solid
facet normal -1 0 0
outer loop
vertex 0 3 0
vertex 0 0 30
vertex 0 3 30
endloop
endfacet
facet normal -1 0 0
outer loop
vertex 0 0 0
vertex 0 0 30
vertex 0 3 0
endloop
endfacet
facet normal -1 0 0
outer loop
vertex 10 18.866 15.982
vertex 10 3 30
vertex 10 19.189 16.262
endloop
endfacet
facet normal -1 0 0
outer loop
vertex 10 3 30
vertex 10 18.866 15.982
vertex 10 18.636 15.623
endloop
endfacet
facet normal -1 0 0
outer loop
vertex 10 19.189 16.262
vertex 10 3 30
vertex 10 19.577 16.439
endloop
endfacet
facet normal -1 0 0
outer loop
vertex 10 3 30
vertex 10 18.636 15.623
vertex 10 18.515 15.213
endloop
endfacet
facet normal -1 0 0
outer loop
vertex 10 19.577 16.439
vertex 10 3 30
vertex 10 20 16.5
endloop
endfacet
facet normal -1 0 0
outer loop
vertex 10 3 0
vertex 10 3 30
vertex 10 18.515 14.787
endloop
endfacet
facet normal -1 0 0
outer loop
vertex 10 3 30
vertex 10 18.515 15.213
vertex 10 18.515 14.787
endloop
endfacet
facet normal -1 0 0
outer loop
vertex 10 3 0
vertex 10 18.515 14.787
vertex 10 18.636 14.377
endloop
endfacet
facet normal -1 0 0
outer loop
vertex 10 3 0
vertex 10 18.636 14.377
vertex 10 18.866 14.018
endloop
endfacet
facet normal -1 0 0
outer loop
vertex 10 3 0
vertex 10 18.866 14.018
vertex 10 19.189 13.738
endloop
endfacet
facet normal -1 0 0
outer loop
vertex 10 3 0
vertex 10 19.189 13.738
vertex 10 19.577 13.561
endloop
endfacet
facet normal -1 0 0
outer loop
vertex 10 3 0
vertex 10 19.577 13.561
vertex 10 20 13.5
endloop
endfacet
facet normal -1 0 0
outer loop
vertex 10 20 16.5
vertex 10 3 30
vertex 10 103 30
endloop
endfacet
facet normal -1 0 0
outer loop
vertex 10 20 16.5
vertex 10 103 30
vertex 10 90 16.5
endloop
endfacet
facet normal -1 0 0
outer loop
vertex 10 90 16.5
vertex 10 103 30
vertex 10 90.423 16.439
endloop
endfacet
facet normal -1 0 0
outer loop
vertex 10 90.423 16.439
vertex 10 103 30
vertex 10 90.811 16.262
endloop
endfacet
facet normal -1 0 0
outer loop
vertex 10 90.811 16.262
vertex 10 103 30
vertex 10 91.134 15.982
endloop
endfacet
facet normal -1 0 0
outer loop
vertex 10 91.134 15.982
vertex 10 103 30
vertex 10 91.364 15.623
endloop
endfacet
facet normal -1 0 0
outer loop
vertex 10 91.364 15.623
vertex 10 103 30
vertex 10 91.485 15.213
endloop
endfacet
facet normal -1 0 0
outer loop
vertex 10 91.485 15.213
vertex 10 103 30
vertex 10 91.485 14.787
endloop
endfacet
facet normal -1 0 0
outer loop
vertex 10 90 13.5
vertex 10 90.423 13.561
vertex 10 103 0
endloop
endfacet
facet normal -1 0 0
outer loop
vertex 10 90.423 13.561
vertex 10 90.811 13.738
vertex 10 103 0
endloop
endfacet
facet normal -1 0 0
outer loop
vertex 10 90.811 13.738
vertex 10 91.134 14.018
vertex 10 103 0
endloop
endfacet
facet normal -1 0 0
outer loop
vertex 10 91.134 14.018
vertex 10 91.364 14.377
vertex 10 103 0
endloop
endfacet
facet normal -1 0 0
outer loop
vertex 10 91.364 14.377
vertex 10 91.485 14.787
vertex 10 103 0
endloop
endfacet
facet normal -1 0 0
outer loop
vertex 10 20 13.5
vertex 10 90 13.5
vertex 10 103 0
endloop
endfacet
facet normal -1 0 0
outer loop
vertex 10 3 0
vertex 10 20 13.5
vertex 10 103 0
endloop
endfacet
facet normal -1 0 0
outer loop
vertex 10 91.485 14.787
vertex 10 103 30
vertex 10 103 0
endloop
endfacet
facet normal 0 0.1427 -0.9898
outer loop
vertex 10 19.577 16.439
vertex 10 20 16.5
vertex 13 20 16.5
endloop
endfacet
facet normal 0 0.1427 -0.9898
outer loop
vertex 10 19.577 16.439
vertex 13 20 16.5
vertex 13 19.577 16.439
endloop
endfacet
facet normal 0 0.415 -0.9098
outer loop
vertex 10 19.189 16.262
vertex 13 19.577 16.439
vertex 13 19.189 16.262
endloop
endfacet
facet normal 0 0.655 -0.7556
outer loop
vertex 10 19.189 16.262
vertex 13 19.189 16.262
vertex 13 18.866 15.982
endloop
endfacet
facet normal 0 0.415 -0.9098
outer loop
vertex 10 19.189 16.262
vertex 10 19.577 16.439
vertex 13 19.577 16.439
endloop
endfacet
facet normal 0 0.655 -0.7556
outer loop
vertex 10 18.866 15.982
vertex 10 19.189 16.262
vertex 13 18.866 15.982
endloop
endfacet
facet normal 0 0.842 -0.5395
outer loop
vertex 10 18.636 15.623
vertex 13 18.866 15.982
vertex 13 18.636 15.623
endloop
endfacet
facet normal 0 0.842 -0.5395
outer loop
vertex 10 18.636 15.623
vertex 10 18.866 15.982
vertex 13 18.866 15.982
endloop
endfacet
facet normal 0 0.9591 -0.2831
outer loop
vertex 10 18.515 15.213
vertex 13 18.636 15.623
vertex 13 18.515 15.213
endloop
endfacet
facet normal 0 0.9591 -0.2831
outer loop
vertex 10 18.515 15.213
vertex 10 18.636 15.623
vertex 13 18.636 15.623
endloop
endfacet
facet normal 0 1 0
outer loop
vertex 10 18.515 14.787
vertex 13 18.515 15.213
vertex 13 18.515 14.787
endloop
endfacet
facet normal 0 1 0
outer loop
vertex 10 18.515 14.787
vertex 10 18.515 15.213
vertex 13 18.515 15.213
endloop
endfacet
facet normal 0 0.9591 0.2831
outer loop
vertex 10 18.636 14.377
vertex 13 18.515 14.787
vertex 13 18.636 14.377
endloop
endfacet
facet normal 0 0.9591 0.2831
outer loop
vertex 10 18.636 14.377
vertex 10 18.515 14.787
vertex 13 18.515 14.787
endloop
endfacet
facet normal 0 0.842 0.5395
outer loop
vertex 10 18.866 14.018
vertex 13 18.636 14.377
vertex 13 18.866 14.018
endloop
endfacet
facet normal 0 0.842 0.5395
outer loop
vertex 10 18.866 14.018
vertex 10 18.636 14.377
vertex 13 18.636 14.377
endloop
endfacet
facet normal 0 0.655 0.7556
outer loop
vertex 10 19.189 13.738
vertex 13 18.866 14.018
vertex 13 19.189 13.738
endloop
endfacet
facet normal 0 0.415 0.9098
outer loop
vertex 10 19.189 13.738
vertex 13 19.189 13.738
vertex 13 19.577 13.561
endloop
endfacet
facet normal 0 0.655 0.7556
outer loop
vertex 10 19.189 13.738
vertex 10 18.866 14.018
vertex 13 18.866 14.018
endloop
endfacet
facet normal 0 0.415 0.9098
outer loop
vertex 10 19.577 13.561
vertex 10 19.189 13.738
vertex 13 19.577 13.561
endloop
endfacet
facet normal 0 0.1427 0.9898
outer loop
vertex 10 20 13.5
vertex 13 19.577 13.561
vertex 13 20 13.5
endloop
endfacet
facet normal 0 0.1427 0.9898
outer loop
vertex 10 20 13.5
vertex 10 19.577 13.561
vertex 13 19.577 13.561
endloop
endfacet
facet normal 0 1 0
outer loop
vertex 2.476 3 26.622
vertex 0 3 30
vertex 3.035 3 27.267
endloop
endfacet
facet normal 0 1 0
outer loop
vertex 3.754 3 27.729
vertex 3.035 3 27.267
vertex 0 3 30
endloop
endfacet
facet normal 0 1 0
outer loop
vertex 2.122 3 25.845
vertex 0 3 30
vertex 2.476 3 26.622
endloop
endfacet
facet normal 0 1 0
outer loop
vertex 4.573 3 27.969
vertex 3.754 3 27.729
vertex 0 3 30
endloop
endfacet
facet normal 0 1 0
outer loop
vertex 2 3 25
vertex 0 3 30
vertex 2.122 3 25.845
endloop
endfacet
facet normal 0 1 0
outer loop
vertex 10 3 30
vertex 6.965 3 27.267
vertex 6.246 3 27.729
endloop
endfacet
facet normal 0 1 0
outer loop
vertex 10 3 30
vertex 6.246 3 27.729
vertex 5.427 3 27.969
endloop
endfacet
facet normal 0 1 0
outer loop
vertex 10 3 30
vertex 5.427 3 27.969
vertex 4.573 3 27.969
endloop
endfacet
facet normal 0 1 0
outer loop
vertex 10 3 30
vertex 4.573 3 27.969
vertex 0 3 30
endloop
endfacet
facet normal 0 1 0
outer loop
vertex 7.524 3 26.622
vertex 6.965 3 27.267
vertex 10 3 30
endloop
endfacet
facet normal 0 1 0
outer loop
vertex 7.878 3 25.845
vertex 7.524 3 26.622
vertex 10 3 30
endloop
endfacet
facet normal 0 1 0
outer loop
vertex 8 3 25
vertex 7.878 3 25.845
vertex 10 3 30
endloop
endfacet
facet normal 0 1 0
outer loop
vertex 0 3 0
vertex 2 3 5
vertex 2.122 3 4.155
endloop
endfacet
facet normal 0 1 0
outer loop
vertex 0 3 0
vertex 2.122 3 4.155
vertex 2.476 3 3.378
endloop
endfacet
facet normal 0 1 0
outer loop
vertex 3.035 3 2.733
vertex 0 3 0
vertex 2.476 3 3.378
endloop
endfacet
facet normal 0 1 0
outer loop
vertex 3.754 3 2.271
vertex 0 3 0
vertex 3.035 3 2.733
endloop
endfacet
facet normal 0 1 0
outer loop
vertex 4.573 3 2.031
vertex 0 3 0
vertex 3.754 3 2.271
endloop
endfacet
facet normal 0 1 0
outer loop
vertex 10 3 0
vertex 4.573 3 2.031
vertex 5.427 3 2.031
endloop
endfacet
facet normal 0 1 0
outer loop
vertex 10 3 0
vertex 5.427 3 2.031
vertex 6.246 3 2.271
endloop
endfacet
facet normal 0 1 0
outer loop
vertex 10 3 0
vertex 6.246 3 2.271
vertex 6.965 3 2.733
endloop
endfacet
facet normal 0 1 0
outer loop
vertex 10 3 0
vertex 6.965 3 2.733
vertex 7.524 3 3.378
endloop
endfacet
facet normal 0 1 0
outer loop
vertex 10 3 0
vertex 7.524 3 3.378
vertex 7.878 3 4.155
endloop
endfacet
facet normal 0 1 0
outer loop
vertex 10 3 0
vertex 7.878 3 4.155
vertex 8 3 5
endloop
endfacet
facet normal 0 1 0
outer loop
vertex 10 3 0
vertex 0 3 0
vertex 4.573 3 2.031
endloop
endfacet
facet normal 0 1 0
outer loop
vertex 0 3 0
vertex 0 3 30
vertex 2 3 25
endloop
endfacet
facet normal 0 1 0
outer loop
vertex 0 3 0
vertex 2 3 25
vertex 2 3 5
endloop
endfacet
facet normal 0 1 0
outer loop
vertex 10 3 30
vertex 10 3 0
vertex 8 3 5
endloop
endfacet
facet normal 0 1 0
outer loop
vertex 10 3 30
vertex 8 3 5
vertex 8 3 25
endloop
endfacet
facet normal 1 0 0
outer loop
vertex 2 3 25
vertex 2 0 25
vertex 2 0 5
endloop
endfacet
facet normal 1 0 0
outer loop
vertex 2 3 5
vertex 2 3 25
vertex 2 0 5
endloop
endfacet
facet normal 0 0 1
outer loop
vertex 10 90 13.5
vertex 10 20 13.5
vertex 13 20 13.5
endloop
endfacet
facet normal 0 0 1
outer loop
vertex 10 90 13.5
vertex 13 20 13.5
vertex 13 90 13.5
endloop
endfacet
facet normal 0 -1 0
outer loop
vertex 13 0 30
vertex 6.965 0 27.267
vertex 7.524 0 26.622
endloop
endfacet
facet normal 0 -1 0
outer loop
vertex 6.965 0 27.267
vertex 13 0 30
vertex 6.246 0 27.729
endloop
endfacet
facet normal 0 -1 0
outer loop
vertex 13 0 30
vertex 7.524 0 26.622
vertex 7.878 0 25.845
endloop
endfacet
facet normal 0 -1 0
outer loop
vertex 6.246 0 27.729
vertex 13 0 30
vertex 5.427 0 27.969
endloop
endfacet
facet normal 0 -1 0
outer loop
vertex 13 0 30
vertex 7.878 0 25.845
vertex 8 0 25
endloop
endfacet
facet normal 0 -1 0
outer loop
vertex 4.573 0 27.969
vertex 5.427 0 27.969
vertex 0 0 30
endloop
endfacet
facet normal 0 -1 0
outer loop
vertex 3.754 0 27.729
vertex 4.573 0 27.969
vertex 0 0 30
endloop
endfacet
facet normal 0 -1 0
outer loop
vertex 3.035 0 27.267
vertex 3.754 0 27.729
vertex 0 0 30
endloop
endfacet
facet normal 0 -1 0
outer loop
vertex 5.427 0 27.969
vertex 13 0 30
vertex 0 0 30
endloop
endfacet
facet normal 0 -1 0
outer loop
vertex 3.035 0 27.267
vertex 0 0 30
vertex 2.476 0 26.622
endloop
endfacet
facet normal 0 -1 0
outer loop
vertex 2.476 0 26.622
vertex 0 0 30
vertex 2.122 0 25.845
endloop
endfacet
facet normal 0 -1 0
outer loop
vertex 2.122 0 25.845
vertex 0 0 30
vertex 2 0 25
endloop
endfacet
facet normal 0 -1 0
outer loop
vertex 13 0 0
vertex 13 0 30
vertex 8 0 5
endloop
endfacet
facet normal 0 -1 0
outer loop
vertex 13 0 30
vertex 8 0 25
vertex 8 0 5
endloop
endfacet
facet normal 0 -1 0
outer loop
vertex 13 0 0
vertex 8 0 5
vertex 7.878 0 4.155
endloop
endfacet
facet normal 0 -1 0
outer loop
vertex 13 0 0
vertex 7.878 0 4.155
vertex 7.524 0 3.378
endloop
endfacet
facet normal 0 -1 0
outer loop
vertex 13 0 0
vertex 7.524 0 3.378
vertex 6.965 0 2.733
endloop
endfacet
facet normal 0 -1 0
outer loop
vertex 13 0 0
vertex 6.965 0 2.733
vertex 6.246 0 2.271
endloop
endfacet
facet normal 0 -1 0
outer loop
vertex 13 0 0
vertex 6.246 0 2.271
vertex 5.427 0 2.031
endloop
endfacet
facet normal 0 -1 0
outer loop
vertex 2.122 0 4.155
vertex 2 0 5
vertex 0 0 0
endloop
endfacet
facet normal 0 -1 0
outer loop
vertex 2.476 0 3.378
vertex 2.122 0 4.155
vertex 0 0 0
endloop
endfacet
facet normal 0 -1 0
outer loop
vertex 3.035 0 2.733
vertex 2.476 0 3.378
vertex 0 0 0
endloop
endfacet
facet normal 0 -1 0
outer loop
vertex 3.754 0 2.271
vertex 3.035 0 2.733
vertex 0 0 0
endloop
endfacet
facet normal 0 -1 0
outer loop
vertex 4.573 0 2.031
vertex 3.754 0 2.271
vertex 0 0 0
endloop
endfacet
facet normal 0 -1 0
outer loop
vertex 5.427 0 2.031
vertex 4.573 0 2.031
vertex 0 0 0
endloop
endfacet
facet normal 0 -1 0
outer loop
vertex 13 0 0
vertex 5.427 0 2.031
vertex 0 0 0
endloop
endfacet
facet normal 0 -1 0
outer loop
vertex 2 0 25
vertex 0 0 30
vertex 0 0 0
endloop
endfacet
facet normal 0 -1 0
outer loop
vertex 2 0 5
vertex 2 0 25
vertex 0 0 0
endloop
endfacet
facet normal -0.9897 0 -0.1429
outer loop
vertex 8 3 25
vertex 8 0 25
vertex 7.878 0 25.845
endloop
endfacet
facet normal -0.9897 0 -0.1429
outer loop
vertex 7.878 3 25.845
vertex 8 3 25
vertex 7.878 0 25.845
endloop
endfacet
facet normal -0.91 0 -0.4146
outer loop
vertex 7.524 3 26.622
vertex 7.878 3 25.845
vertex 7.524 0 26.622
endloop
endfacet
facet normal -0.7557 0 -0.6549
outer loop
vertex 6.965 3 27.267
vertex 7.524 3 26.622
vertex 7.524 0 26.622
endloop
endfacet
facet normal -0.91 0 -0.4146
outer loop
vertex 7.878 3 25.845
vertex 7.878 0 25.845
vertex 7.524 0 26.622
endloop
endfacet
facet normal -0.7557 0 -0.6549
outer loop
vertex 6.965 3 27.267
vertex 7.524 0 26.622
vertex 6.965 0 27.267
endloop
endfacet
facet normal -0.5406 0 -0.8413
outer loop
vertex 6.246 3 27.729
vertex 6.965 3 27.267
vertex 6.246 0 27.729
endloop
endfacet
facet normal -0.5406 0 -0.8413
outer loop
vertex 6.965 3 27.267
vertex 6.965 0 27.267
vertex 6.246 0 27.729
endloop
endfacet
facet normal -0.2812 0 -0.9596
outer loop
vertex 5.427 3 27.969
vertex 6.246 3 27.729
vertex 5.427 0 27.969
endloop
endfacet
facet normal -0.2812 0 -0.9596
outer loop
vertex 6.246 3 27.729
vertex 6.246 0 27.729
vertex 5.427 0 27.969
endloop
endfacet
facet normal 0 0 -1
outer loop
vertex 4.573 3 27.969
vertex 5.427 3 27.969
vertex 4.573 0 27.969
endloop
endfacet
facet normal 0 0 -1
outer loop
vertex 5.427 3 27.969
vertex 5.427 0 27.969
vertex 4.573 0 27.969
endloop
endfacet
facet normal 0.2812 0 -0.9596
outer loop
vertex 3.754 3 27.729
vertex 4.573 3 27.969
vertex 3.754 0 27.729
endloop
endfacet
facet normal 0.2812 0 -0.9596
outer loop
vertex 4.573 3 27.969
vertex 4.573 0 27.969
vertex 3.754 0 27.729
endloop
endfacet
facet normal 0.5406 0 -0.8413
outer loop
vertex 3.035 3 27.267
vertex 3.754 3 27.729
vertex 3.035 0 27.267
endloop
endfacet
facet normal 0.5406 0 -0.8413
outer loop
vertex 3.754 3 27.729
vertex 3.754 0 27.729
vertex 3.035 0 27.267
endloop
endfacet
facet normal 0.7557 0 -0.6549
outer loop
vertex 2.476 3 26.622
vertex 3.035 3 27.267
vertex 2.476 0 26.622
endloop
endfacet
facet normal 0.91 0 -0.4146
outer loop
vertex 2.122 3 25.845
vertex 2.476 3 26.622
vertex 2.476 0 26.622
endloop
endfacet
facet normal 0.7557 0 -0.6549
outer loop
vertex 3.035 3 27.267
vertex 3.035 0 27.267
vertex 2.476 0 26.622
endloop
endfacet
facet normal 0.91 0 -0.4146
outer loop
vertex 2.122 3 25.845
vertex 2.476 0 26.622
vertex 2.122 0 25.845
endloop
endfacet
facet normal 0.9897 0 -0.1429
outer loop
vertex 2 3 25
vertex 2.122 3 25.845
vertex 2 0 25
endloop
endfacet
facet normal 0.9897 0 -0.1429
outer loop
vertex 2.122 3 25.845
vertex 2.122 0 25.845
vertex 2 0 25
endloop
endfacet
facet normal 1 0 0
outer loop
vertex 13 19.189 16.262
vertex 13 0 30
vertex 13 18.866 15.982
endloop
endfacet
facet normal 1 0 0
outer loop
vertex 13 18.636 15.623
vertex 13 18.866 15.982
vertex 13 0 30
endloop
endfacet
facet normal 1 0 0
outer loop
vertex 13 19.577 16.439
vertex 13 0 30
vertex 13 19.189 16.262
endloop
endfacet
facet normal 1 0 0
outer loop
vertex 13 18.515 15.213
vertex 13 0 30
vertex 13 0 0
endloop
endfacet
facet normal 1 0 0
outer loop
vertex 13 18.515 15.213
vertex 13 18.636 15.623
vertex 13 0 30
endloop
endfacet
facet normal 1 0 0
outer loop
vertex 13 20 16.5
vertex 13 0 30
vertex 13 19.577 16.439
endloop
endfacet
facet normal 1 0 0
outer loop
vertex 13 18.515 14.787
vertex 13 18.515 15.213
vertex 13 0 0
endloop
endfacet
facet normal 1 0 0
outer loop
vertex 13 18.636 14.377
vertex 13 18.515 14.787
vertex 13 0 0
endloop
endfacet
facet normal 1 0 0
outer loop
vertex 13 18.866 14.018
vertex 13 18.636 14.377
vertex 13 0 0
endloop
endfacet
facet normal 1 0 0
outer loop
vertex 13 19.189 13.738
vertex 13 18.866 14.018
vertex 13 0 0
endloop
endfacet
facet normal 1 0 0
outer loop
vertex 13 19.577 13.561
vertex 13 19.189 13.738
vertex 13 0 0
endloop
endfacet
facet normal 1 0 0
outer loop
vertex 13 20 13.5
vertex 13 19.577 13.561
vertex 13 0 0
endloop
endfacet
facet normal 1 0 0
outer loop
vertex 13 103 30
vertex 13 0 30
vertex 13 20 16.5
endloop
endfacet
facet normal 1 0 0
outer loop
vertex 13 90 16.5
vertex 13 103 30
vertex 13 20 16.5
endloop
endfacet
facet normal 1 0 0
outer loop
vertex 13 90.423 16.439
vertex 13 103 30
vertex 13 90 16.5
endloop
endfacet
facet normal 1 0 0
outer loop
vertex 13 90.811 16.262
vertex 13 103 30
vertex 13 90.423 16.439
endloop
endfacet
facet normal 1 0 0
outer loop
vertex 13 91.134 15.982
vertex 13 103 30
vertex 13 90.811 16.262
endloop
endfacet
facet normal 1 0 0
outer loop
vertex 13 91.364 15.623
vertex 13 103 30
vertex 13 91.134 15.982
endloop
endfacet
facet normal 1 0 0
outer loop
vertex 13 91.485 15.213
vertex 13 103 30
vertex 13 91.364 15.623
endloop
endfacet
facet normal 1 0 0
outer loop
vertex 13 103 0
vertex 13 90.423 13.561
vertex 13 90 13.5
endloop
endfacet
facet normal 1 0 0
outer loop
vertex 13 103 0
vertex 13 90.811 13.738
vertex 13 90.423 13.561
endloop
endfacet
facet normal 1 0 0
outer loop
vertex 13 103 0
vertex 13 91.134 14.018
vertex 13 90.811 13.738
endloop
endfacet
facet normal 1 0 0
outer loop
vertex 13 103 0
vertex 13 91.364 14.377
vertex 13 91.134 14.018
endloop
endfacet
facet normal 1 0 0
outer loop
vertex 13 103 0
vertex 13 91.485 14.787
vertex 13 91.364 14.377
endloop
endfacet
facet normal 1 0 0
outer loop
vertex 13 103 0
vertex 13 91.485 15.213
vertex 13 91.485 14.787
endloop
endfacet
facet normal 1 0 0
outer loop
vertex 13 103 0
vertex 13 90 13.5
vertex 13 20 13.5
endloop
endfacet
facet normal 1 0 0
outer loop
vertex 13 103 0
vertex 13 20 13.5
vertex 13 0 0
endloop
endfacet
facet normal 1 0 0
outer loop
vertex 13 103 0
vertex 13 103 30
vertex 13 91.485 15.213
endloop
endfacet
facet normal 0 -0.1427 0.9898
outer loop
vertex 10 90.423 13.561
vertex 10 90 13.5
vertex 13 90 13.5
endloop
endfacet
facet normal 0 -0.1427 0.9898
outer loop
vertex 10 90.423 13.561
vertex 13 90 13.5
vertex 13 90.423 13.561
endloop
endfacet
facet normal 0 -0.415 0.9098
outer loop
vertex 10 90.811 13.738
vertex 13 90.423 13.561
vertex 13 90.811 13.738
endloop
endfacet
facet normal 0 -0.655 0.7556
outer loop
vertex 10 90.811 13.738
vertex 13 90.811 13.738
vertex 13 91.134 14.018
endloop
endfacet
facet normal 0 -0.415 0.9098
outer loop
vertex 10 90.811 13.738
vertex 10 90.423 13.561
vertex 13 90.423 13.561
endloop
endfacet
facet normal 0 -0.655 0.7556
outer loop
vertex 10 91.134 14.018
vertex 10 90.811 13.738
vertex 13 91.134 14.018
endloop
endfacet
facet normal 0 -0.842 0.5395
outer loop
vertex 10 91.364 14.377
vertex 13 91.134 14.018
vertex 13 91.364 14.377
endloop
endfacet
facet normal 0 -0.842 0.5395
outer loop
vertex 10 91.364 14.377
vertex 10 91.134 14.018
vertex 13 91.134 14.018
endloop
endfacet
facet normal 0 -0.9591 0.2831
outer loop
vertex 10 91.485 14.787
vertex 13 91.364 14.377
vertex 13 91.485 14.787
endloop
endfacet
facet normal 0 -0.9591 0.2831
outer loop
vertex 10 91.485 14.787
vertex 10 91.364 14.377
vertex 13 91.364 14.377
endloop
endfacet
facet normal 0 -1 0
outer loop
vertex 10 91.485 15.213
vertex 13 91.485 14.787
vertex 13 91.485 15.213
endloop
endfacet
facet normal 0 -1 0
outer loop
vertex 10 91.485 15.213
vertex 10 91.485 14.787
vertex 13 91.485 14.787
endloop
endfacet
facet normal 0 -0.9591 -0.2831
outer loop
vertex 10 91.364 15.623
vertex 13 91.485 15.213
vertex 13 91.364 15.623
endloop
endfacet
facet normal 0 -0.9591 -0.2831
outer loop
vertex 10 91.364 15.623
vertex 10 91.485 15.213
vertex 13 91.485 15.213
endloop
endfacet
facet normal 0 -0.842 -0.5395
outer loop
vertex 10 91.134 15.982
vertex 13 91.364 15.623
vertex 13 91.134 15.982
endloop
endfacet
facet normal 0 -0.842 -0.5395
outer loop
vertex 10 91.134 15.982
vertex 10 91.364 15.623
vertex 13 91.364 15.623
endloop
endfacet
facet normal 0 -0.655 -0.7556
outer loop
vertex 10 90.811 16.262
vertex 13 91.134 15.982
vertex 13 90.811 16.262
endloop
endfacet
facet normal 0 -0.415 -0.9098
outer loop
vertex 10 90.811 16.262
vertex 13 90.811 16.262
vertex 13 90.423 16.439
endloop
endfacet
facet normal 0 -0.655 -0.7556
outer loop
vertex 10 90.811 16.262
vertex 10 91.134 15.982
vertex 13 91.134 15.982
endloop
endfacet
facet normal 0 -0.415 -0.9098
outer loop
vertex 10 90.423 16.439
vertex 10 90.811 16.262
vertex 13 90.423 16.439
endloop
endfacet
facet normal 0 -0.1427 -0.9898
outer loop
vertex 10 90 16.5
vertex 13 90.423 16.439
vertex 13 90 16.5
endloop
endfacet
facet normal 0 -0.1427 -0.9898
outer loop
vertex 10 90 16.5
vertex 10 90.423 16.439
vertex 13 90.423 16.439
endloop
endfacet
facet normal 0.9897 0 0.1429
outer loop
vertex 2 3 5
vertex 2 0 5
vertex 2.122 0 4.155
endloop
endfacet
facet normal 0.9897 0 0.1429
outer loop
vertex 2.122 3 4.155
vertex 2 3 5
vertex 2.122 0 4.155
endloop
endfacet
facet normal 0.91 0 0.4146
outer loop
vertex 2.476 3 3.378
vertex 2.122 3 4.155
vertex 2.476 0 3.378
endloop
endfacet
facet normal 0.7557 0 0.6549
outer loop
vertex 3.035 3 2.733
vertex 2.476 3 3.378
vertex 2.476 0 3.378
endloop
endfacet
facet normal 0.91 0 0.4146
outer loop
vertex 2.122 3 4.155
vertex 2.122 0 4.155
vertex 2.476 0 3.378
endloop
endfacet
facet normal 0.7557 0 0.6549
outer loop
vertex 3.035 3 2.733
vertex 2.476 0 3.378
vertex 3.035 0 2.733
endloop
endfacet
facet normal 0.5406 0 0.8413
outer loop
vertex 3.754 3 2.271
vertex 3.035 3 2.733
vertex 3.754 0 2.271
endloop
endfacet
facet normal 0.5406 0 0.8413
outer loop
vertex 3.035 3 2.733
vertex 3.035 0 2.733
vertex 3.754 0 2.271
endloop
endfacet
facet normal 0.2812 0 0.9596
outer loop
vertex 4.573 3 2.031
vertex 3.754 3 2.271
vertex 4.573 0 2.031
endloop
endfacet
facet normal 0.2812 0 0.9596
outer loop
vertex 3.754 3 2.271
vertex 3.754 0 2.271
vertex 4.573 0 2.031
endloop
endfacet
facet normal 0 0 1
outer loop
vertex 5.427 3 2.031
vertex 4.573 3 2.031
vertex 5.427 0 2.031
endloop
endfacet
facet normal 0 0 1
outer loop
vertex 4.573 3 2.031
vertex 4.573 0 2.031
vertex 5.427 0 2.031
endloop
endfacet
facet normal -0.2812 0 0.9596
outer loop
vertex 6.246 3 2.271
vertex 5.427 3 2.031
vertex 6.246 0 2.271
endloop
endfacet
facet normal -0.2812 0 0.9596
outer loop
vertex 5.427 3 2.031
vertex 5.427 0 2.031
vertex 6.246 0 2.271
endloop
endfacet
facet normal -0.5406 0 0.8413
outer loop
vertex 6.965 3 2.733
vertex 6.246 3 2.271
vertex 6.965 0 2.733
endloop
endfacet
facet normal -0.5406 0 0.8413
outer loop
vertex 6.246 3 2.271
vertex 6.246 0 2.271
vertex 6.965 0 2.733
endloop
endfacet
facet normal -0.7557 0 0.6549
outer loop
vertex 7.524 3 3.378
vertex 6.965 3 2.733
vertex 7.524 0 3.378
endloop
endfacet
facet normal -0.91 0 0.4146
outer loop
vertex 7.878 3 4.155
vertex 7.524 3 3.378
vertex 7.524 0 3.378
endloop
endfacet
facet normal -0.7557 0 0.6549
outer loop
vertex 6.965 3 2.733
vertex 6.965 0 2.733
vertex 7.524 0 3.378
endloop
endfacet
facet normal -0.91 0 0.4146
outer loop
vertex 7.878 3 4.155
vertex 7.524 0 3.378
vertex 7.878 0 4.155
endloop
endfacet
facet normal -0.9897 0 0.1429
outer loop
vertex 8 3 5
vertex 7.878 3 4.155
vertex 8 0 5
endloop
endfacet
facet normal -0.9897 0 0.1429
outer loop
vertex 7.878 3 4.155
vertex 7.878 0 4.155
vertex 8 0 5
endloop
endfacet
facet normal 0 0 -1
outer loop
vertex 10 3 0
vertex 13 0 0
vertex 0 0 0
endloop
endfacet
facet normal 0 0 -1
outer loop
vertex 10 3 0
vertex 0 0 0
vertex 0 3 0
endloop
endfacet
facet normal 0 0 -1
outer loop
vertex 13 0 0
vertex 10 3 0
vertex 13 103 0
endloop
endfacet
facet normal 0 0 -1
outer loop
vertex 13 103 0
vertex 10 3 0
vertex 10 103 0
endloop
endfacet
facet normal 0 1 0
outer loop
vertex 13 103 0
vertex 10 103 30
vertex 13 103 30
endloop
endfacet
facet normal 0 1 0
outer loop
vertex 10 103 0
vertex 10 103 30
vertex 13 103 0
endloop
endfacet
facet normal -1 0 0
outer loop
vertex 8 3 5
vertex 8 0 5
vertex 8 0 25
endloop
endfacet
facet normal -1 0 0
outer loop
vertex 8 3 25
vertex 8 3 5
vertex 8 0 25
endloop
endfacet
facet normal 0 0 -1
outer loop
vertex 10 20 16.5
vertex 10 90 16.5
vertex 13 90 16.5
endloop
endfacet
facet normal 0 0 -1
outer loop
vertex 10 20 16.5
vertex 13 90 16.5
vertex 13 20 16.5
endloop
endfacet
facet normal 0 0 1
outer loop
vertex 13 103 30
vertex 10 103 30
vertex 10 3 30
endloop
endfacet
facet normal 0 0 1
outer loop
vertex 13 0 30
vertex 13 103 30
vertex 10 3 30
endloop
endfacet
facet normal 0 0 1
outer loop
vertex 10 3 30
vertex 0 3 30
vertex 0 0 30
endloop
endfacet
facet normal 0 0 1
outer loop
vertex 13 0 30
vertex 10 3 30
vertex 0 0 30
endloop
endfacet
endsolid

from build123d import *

# Parameters (mm, degrees)
SKETCH_5_W          = 10
SKETCH_5_H          = 30
EXTRUDE_5_DEPTH     = 3
SKETCH_6_W          = 30
SKETCH_6_H          = 100
SKETCH_6_H_2        = 3
EXTRUDE_6_DEPTH     = 3
CUT_EXTRUDE_2_DEPTH = 3


with BuildPart() as part:
    # 草图5 → 凸台-拉伸5 (new body)
    with BuildSketch(Plane(origin=(0, 0, 0), x_dir=(1, 0, 0), z_dir=(0, 1, 0))):
        with Locations((5, -15)):
            Rectangle(SKETCH_5_W, SKETCH_5_H)
        with BuildLine():
            Line((8, -5), (8, -25))
            ThreePointArc((8, -25), (5, -28), (2, -25))
            Line((2, -25), (2, -5))
            ThreePointArc((2, -5), (5, -2), (8, -5))
        make_face(mode=Mode.SUBTRACT)
    extrude(amount=EXTRUDE_5_DEPTH)

    # 草图6 → 凸台-拉伸6 (add)
    with BuildSketch(Plane(origin=(10, 0, 0), x_dir=(0, 0, -1), z_dir=(1, 0, 0))):
        with Locations((-15, 53)):
            Rectangle(SKETCH_6_W, SKETCH_6_H)
        with Locations((-15, 1.5)):
            Rectangle(SKETCH_6_W, SKETCH_6_H_2)
    extrude(amount=EXTRUDE_6_DEPTH)

    # 草图7 → 切除-拉伸2 (cut)
    with BuildSketch(Plane.ZY.offset(-10)):
        with BuildLine():
            Line((16.5, 90), (16.5, 20))
            ThreePointArc((16.5, 20), (15, 18.5), (13.5, 20))
            Line((13.5, 20), (13.5, 90))
            ThreePointArc((13.5, 90), (15, 91.5), (16.5, 90))
        make_face()
    extrude(amount=-CUT_EXTRUDE_2_DEPTH, mode=Mode.SUBTRACT)


solid = part.part
